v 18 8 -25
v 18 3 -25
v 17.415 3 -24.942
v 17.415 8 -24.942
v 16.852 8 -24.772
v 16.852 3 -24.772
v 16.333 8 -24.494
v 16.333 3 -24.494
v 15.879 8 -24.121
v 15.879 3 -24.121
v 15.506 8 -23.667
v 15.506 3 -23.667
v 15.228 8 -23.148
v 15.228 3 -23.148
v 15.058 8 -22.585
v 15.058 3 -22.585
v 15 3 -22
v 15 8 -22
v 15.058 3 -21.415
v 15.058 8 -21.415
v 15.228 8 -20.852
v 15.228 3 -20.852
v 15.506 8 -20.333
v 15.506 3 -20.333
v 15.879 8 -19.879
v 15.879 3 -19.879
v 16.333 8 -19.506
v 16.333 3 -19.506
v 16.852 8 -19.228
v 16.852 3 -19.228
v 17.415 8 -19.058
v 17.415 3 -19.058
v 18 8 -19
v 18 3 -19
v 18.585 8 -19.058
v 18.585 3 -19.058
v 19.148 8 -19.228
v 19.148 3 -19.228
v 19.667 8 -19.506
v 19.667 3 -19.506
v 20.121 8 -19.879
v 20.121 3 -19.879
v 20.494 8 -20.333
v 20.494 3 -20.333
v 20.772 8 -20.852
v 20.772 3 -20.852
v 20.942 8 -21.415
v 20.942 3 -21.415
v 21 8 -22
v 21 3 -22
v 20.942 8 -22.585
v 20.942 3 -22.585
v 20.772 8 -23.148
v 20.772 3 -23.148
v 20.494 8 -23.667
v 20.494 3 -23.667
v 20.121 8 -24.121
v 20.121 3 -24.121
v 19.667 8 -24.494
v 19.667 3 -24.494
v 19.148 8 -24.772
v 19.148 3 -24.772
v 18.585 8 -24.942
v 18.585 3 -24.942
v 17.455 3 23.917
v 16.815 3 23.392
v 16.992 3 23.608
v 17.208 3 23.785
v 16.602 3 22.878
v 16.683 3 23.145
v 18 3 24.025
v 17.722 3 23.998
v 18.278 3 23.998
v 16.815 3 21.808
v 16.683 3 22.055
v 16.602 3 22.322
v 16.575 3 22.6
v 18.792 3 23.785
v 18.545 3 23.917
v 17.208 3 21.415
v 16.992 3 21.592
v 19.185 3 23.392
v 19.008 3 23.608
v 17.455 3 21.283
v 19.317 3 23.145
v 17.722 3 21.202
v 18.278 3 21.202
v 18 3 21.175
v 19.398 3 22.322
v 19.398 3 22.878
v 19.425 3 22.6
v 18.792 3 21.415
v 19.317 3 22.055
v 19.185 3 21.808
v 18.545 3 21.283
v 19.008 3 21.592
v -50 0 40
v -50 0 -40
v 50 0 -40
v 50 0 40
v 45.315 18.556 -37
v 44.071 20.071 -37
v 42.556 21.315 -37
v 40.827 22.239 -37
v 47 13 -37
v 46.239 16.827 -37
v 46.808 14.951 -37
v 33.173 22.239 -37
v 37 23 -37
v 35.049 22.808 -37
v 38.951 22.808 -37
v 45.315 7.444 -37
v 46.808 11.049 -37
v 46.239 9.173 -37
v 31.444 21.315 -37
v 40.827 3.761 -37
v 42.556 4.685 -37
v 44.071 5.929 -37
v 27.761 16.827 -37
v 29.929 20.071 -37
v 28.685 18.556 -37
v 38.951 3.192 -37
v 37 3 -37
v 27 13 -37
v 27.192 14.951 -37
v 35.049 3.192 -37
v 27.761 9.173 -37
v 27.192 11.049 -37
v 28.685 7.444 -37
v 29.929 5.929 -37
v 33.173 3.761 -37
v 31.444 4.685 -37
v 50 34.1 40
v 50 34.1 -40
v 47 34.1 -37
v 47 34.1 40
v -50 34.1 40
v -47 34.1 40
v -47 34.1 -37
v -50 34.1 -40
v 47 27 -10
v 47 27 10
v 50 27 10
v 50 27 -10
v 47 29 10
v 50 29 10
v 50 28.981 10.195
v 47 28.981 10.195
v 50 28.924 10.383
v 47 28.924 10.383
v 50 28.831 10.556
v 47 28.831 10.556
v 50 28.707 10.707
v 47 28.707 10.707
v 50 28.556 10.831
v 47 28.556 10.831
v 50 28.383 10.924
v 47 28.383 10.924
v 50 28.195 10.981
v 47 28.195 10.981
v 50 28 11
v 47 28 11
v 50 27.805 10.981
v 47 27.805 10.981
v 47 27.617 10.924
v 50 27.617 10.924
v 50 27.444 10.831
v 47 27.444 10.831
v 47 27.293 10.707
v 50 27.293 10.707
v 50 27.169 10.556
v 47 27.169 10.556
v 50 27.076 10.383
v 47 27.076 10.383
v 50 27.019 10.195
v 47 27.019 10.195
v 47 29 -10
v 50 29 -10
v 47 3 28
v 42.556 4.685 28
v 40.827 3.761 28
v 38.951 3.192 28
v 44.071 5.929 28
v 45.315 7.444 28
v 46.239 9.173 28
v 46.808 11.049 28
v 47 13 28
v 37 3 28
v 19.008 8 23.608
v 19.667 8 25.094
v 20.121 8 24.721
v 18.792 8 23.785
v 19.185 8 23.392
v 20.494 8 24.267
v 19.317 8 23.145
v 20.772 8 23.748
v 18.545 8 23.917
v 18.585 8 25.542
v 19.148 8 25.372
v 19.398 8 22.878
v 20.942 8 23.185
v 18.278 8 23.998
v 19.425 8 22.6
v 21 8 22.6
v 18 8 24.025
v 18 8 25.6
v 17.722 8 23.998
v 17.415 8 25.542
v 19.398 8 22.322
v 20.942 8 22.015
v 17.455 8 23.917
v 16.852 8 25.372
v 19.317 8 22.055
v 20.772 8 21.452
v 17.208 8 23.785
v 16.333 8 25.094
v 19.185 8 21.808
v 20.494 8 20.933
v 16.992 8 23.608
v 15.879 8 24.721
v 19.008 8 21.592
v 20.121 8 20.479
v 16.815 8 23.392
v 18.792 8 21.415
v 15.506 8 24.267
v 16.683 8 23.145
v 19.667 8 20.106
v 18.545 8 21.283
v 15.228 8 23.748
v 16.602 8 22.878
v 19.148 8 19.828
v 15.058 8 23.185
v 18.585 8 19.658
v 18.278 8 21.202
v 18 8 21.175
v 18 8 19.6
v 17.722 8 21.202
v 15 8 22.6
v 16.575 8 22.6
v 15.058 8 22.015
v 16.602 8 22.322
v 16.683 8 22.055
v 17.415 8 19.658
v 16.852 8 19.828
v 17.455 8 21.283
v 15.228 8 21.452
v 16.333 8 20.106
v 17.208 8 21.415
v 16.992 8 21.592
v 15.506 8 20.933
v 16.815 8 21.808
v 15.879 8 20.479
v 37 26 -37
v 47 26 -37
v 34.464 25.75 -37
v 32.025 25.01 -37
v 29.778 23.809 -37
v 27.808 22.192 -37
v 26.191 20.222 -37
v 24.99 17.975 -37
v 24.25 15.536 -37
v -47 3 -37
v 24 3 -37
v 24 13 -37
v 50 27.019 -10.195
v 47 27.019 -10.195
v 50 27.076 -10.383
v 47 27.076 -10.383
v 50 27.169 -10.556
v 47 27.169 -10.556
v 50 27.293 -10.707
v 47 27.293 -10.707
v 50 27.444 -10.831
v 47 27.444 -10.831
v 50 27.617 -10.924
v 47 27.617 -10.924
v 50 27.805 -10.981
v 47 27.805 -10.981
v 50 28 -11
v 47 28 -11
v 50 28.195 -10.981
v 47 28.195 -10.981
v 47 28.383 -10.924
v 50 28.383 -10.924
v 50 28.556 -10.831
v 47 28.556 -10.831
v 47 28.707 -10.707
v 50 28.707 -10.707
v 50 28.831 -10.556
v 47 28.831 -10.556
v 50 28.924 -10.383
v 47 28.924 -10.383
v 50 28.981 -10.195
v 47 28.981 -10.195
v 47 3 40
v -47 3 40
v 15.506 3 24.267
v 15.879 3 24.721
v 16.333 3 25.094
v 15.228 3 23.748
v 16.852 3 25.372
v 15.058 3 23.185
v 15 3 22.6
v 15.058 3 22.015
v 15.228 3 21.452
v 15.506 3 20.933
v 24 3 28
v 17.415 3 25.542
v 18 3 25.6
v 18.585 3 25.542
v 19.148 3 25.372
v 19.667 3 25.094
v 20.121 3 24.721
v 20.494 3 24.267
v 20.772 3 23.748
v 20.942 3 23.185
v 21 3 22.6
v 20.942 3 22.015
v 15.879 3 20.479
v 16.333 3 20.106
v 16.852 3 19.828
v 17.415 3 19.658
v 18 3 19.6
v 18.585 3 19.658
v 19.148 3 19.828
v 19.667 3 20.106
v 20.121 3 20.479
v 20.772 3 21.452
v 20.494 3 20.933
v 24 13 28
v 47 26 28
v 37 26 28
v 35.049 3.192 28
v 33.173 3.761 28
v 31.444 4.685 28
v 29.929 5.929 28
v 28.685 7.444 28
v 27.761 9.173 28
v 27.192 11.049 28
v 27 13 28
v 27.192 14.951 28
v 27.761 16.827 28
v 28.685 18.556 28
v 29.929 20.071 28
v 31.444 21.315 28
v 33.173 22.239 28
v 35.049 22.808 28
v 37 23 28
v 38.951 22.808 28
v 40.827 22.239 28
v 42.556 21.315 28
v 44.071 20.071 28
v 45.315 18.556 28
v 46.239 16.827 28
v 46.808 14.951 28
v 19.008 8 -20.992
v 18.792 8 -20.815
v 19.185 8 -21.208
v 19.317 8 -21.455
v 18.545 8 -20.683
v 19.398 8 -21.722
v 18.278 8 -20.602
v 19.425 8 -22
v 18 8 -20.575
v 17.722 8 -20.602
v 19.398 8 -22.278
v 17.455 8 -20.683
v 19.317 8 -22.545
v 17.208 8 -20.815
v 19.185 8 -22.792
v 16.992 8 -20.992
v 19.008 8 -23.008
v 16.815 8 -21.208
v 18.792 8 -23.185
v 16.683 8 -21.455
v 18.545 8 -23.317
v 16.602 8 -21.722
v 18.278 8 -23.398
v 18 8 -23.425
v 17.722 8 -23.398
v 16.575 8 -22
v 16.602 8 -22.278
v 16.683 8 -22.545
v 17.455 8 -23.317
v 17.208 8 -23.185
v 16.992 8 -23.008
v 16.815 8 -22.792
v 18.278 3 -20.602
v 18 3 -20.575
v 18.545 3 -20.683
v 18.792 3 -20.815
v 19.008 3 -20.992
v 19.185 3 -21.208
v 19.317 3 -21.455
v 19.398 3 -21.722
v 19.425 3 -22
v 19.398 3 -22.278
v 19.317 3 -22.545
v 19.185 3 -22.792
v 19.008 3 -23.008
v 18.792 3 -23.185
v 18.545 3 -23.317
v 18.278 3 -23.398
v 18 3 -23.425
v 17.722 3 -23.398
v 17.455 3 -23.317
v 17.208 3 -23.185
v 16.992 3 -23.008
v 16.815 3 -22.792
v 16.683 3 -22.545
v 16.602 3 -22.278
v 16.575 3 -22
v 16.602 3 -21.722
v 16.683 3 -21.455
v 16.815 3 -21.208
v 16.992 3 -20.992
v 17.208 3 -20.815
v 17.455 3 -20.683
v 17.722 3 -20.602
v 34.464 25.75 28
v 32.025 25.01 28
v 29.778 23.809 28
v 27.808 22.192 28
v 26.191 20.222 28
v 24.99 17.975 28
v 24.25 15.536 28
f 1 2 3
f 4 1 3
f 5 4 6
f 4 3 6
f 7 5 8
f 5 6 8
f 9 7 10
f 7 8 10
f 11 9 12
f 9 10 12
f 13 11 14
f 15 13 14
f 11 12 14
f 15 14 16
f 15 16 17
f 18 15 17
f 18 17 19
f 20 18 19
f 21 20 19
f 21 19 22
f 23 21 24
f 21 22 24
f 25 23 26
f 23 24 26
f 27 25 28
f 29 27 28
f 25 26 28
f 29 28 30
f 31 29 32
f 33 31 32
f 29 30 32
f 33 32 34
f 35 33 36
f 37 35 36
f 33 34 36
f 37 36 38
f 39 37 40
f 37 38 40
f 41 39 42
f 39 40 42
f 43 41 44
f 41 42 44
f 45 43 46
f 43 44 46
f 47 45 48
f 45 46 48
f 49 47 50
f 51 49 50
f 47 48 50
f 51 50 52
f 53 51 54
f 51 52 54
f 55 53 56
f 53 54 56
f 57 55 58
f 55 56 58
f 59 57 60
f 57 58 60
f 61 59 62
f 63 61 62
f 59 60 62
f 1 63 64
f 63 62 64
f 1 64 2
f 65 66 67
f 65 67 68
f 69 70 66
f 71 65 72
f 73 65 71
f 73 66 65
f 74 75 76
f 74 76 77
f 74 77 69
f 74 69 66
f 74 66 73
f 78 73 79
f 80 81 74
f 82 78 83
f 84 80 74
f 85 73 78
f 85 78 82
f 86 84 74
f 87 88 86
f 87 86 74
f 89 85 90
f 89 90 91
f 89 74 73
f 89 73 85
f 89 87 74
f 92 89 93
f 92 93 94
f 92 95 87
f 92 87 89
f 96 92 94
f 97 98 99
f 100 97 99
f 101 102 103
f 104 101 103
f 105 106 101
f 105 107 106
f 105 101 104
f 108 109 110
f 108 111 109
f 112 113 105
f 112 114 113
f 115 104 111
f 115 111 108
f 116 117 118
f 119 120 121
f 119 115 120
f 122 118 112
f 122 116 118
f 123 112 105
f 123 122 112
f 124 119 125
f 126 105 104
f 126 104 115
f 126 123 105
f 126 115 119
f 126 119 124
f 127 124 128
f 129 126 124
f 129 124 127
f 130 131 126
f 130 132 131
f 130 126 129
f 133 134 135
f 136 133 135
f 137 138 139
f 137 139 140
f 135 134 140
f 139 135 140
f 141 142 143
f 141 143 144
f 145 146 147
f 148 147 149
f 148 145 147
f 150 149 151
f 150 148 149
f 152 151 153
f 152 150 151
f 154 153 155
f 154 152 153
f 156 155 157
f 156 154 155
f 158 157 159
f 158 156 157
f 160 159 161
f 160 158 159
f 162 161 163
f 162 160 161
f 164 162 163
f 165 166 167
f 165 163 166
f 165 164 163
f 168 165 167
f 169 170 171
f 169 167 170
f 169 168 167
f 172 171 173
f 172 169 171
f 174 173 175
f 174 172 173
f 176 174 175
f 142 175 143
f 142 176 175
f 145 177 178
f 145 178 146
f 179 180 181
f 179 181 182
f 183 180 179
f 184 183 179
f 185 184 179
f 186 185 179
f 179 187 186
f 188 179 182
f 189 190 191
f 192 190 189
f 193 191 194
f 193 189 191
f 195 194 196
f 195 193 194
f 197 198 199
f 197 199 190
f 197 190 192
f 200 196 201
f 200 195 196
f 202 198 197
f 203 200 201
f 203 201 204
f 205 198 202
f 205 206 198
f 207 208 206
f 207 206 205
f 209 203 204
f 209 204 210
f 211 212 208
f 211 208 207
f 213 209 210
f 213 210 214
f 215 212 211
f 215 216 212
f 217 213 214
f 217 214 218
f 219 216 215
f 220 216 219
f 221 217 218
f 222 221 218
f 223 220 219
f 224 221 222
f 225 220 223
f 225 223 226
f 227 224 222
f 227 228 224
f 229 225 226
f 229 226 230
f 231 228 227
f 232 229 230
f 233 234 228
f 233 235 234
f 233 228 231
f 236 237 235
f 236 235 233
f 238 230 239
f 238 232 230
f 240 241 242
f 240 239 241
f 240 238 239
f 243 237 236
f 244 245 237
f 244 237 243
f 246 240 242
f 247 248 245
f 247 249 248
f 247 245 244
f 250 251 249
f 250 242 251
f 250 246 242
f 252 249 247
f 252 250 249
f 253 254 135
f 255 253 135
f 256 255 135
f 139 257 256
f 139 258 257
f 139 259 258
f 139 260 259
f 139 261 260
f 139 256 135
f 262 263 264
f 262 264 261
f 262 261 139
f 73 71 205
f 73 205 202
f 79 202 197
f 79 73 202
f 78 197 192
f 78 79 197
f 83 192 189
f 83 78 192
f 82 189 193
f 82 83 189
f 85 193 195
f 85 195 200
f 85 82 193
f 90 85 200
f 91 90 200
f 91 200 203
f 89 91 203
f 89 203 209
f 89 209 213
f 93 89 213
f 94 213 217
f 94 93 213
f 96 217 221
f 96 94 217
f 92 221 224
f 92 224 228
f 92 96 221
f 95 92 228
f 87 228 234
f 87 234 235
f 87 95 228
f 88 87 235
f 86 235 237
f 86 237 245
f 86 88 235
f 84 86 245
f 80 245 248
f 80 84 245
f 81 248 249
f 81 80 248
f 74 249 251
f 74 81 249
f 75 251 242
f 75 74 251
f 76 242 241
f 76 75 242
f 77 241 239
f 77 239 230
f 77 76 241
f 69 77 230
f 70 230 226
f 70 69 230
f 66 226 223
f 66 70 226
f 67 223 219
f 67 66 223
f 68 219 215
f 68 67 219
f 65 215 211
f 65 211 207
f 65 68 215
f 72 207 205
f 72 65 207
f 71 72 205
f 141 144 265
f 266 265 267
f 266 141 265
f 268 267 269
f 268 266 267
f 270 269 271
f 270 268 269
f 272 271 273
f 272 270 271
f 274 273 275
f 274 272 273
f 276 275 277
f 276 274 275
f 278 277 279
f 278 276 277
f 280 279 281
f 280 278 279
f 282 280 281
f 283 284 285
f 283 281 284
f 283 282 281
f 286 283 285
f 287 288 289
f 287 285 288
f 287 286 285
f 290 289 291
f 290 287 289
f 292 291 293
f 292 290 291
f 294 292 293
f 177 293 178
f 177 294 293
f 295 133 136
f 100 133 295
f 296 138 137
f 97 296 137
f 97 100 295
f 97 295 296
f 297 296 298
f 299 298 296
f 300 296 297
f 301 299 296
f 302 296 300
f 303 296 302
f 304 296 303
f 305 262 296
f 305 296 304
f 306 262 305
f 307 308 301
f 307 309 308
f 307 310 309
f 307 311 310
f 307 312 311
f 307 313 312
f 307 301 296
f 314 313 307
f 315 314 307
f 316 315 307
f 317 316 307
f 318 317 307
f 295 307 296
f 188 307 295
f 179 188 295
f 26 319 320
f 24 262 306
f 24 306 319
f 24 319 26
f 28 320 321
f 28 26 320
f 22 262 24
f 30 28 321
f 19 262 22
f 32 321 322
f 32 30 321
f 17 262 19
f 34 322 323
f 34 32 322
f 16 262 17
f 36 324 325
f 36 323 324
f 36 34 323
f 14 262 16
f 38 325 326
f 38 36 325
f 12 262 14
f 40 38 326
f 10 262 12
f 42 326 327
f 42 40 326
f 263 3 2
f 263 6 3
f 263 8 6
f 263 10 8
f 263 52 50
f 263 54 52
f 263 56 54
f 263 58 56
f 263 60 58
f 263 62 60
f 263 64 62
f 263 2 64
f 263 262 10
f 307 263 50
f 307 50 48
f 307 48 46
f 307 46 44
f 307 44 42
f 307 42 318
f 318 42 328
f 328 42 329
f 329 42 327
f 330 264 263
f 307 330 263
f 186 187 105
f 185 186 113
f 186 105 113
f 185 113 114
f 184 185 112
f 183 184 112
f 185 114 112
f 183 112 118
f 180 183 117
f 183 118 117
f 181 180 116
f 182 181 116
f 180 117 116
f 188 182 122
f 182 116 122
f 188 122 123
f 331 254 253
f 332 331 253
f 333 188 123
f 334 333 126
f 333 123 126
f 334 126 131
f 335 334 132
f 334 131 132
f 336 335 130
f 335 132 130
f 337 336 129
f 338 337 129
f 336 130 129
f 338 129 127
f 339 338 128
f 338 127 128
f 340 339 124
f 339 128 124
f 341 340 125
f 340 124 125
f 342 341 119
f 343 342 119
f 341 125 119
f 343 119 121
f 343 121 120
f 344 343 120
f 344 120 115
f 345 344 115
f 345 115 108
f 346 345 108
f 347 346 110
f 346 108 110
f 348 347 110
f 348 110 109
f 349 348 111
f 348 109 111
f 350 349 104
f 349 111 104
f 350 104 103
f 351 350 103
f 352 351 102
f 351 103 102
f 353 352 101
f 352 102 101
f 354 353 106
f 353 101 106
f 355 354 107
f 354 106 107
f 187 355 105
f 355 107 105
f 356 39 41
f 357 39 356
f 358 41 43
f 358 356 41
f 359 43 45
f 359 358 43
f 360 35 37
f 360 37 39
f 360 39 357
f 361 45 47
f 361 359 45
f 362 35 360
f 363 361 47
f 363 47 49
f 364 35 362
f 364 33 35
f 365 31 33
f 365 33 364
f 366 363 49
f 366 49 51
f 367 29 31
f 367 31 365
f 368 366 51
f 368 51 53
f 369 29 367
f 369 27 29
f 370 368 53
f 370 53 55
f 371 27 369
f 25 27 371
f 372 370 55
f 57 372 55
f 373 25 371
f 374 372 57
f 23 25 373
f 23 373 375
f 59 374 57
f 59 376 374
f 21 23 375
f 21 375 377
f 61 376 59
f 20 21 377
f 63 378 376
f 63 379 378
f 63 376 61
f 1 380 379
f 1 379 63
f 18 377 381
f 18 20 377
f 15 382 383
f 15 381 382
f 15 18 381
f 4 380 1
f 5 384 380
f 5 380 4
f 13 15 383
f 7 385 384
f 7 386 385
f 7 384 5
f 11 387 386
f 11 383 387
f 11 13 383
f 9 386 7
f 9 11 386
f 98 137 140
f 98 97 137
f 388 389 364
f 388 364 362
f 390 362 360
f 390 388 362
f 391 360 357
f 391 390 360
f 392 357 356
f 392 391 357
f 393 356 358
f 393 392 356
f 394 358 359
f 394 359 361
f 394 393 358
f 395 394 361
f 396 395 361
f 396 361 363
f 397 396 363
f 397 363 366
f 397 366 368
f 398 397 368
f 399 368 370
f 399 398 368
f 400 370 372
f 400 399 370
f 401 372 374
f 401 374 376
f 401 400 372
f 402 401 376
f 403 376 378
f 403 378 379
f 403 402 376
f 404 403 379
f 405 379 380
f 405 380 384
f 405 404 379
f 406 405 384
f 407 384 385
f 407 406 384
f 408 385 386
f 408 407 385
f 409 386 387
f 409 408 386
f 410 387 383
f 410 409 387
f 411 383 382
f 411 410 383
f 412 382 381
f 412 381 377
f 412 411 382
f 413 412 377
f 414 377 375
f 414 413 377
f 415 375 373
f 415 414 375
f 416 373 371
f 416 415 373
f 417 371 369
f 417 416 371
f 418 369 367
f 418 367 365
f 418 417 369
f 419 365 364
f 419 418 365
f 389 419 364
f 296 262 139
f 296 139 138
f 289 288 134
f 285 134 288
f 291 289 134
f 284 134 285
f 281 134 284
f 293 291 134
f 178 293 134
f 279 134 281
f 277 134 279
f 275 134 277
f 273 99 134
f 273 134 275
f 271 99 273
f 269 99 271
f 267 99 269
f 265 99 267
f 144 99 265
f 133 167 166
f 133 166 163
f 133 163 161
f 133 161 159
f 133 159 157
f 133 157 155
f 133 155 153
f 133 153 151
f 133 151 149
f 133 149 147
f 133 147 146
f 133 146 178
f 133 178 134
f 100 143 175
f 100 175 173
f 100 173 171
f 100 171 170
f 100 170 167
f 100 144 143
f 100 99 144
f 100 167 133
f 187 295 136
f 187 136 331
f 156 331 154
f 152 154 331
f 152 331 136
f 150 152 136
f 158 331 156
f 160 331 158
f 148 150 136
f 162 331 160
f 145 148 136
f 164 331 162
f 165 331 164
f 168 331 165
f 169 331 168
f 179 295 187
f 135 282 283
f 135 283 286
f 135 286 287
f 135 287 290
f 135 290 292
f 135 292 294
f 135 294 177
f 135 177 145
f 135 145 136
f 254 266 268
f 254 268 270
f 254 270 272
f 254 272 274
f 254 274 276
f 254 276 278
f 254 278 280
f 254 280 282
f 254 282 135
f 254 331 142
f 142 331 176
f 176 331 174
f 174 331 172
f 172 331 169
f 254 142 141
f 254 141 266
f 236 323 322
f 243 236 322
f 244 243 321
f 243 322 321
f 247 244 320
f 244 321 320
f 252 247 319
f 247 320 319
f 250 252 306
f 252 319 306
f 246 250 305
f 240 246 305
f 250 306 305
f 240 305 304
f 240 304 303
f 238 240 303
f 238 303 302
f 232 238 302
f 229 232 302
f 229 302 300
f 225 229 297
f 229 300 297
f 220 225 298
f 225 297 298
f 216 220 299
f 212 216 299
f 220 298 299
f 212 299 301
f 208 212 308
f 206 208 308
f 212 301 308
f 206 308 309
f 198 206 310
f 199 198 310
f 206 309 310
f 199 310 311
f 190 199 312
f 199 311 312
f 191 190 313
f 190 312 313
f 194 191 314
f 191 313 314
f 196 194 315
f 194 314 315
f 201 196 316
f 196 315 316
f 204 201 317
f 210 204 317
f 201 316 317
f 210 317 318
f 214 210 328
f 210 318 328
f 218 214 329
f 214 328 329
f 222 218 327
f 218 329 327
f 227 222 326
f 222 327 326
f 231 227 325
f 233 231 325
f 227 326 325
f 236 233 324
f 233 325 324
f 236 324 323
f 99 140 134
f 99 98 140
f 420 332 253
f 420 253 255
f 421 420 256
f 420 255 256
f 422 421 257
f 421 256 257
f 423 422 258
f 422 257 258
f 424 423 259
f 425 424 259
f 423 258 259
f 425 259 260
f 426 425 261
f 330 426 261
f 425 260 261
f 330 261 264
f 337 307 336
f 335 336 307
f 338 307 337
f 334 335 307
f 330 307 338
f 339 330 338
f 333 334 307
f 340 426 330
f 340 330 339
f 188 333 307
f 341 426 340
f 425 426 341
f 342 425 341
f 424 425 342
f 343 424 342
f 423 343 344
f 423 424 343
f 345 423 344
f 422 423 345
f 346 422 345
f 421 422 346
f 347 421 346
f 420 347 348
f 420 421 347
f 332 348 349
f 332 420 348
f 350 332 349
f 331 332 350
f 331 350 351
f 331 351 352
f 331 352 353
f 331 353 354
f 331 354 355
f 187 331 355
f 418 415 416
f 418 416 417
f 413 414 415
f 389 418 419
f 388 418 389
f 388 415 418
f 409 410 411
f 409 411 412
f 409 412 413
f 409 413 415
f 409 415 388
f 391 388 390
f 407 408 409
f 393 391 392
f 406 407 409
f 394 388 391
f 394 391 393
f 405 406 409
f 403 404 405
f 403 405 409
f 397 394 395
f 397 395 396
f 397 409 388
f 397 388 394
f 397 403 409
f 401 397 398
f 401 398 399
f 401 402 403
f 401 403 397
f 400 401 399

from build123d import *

# Parameters (mm, degrees)
SKETCH1_W           = 100
SKETCH1_H           = 80
BOSS_EXTRUDE1_DEPTH = 3
BOSS_EXTRUDE2_DEPTH = 31.1
BOSS_EXTRUDE3_DEPTH = 65
SKETCH4_R           = 3
SKETCH4_R_2         = 1.425
BOSS_EXTRUDE4_DEPTH = 5
LPATTERN1_COUNT     = 2
LPATTERN1_PITCH     = 44.6
CUT_EXTRUDE1_DEPTH  = 111.325926237


with BuildPart() as part:
    # Sketch1 → Boss-Extrude1 (new body)
    with BuildSketch(Plane(origin=(0, 0, 0), x_dir=(1, 0, 0), z_dir=(0, 1, 0))):
        Rectangle(SKETCH1_W, SKETCH1_H)
    extrude(amount=BOSS_EXTRUDE1_DEPTH)

    # Sketch2 → Boss-Extrude2 (add)
    with BuildSketch(Plane(origin=(0, 3, 0), x_dir=(1, 0, 0), z_dir=(0, 1, 0))):
        Polygon((-50, 40), (50, 40), (50, -40), (47, -40), (47, 37), (-47, 37), (-47, -40), (-50, -40), align=None)
    extrude(amount=BOSS_EXTRUDE2_DEPTH)

    # Sketch3 → Boss-Extrude3 (add)
    with BuildSketch(Plane.XY.offset(-37)):
        with BuildLine():
            Line((47, 26), (37, 26))
            ThreePointArc((37, 26), (27.807611845, 22.192388155), (24, 13))
            Line((24, 13), (24, 3))
            Line((24, 3), (37, 3))
            ThreePointArc((37, 3), (29.928932188, 20.071067812), (47, 13))
            Line((47, 13), (47, 26))
        make_face()
        with BuildLine():
            Line((47, 3), (47, 13))
            ThreePointArc((47, 13), (44.071067812, 5.928932188), (37, 3))
            Line((37, 3), (47, 3))
        make_face()
    extrude(amount=BOSS_EXTRUDE3_DEPTH)

    # Sketch4 → Boss-Extrude4 (add)
    with BuildSketch(Plane(origin=(0, 3, 0), x_dir=(1, 0, 0), z_dir=(0, 1, 0))):
        with Locations(Location((18, 22, 0), (0, 0, 90))):
            Circle(SKETCH4_R)
        with Locations(Location((18, 22, 0), (0, 0, 270))):
            Circle(SKETCH4_R_2, mode=Mode.SUBTRACT)
    boss_extrude4 = extrude(amount=BOSS_EXTRUDE4_DEPTH)

    # LPattern1: Boss-Extrude4 ×2
    with Locations(*[(0, 0, i * LPATTERN1_PITCH) for i in range(1, LPATTERN1_COUNT)]):
        add(boss_extrude4)

    # Sketch10 → Cut-Extrude1 (cut, through all)
    with BuildSketch(Plane.ZY.offset(-47)):
        with BuildLine():
            Line((-10, 29), (10, 29))
            ThreePointArc((10, 29), (11, 28), (10, 27))
            Line((10, 27), (-10, 27))
            ThreePointArc((-10, 27), (-11, 28), (-10, 29))
        make_face()
    extrude(amount=-CUT_EXTRUDE1_DEPTH, mode=Mode.SUBTRACT)


solid = part.part
